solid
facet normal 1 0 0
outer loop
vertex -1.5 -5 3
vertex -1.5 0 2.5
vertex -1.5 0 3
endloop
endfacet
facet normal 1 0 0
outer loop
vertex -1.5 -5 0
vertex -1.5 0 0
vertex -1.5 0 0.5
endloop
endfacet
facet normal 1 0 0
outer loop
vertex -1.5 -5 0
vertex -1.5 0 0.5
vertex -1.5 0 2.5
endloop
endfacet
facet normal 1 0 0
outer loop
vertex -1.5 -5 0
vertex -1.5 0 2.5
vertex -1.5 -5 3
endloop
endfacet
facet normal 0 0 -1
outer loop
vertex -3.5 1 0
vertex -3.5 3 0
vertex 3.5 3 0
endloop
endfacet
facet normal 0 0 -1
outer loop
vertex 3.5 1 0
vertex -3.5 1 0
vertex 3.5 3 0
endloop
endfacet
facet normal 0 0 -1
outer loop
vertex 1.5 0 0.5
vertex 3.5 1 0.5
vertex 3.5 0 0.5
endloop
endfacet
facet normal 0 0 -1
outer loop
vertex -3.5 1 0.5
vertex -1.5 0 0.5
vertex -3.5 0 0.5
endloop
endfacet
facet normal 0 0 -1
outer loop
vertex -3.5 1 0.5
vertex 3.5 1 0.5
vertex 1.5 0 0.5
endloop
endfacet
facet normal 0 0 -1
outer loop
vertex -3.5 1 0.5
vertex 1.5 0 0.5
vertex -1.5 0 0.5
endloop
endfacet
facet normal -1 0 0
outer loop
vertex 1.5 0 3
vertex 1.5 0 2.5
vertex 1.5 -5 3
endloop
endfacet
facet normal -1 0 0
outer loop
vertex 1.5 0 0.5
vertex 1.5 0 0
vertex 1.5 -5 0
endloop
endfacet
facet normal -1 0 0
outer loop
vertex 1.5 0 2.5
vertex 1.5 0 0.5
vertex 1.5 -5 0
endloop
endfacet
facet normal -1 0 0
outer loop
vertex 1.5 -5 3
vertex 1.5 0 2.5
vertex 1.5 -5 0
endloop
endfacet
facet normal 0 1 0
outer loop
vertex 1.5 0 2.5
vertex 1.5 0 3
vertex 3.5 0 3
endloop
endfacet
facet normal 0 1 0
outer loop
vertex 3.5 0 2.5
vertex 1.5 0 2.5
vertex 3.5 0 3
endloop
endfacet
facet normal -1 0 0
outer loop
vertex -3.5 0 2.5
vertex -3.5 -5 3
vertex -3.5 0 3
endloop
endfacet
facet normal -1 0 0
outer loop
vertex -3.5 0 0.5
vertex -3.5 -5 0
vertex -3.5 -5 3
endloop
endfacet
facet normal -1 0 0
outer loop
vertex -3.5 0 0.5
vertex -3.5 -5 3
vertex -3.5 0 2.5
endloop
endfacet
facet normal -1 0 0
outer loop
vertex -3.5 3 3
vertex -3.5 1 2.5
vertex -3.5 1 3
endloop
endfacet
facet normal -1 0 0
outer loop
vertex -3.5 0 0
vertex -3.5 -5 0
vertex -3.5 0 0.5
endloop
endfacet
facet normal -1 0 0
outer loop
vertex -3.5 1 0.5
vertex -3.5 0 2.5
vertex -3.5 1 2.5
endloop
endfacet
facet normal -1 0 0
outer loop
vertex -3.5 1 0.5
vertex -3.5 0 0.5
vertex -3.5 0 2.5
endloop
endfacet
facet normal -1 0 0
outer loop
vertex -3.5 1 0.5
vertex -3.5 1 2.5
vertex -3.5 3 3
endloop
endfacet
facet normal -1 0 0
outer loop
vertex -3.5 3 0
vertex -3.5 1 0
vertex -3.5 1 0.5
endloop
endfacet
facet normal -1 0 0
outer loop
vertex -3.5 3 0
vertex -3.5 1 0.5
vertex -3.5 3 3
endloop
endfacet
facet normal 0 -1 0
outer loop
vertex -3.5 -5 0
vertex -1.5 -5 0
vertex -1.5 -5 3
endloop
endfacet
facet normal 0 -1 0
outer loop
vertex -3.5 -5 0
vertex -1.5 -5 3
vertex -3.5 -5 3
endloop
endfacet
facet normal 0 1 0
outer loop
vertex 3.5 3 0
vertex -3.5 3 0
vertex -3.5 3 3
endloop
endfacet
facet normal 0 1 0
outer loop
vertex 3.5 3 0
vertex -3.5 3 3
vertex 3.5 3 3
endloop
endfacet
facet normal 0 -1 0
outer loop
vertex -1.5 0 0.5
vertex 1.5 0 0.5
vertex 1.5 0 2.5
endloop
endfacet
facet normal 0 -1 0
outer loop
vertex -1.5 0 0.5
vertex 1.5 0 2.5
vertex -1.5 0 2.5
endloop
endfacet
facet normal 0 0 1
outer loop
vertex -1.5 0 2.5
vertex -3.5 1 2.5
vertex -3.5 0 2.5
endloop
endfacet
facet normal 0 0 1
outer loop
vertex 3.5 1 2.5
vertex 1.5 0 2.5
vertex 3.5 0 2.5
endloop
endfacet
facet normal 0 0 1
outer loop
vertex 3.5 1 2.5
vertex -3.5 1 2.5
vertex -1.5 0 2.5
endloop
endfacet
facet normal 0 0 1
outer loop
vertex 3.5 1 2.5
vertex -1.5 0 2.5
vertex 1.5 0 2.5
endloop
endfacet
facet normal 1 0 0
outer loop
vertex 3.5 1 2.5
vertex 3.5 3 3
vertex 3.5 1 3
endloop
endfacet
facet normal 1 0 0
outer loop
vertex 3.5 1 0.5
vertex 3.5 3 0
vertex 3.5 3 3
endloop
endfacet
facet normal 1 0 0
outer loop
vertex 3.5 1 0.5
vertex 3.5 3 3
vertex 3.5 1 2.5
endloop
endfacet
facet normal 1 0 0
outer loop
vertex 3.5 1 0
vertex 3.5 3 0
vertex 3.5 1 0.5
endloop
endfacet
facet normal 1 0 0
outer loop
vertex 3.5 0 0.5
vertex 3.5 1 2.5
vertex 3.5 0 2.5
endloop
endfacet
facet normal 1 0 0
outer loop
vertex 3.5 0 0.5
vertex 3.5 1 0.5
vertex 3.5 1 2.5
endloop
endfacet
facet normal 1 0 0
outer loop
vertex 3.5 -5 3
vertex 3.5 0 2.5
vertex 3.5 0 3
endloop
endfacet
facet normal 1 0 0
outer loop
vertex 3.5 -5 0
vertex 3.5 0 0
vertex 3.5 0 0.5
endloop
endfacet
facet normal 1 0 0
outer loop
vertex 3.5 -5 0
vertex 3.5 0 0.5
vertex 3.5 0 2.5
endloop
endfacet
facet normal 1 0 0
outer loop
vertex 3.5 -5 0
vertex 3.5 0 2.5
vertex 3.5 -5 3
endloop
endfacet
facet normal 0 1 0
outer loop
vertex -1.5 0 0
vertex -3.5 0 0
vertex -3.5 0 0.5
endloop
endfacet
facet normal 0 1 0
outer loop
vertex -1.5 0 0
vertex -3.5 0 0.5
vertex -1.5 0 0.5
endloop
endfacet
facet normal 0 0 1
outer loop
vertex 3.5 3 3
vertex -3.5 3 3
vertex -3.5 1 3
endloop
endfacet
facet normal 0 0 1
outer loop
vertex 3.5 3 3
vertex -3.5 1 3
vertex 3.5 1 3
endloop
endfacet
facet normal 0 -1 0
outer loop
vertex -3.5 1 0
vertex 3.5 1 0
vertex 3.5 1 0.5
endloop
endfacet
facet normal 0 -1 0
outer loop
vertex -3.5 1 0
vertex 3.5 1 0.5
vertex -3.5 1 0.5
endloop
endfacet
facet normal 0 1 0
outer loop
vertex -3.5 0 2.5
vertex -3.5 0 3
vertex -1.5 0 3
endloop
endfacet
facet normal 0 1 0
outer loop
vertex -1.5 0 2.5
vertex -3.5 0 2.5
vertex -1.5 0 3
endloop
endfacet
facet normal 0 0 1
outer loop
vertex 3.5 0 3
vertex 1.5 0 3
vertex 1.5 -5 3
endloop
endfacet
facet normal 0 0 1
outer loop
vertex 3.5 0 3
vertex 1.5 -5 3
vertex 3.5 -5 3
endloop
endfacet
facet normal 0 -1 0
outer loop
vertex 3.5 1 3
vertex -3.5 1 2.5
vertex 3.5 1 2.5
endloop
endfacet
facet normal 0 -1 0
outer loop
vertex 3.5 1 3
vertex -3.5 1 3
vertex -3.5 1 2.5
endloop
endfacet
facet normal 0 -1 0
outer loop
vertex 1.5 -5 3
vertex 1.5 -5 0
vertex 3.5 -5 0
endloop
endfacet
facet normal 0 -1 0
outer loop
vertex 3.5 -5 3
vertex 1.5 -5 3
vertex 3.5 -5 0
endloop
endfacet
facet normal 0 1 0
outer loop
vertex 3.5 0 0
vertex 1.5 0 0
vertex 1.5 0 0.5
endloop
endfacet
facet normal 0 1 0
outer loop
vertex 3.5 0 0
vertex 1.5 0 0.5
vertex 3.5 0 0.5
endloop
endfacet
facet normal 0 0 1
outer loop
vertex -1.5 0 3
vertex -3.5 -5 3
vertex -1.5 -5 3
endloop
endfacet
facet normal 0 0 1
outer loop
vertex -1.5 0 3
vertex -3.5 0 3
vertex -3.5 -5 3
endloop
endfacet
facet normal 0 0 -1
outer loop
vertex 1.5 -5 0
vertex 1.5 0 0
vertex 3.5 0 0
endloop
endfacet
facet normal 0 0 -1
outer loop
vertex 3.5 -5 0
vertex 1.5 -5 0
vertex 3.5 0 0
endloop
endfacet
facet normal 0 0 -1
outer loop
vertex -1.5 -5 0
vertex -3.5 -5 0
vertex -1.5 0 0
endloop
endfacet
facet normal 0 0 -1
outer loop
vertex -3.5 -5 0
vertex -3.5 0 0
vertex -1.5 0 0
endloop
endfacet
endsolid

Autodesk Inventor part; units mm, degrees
ref_plane "YZ Plane" through (0, 0, 0) normal (1, 0, 0) x (0, 1, 0)
ref_plane "XZ Plane" through (0, 0, 0) normal (0, 1, 0) x (-1, 0, 0)
ref_plane "XY Plane" through (0, 0, 0) normal (0, 0, 1) x (1, 0, 0)
sketch "Skizze1" plane through (0, 0, 0) normal (0, 0, 1) x (1, 0, 0)
  line L0 (-3.5, 3) -> (3.5, 3)
  line L1 (3.5, 3) -> (3.5, 0)
  line L2 (1.5, 0) -> (-1.5, 0)
  line L3 (-3.5, 0) -> (-3.5, 3)
  line L4 (-1.5, 0) -> (-1.5, -5)
  line L5 (-1.5, -5) -> (-3.5, -5)
  line L6 (-3.5, -5) -> (-3.5, 0)
  line L7 (1.5, -5) -> (3.5, -5)
  line L8 (3.5, -5) -> (3.5, 0)
  line L9 (1.5, 0) -> (1.5, -5)
  point P0 (0, 0)
  point P1 (0, 0)
  dimension "d1" = 5
  dimension "d2" = 7
  dimension "d3" = 2
  dimension "d7" = 0
  dimension "d8" = 5
  dimension "d9" = 2
  dimension "d24" = 3
extrude "Extrusion1" add sketch "Skizze1" along normal blind 3
sketch "Skizze2" plane through (0, 0, 3) normal (0, 0, 1) x (1, 0, 0)
  line L0 (3.5, -5) -> (3.5, 3) projected
  line L1 (-3.5, 3) -> (-3.5, -5) projected
  line L2 (-3.5, 0) -> (-1.5, 0)
  line L3 (1.5, 0) -> (3.5, 0)
  line L4 (-3.5, 1) -> (3.5, 1)
  line L5 (3.5, 0) -> (3.5, 1)
  line L6 (-3.5, 0) -> (-3.5, 1)
  line L7 (-1.5, 0) -> (1.5, 0)
  point P0 (0, 0)
  dimension "d20" = 1
extrude "Extrusion3" cut sketch "Skizze2" against normal blind 0.5
sketch "Skizze5" plane through (0, 0, 0) normal (0, 0, -1) x (-1, 0, 0)
  line L0 (1.5, 0) -> (-1.5, 0) projected
  line L1 (3.5, 3) -> (3.5, -5) projected
  line L2 (-3.5, -5) -> (-3.5, 3) projected
  line L3 (-3.5, 1) -> (3.5, 1)
  line L4 (3.5, 1) -> (3.5, 0)
  line L5 (3.5, 0) -> (-3.5, 0)
  line L6 (-3.5, 0) -> (-3.5, 1)
  point P0 (0, 0)
  point P1 (0, 0)
  dimension "d25" = 1
extrude "Extrusion5" cut sketch "Skizze5" against normal blind 0.5
properties part number "Leistende Kontakt" material "2.0401 CuZn39 Pb 3 (Messing)"
